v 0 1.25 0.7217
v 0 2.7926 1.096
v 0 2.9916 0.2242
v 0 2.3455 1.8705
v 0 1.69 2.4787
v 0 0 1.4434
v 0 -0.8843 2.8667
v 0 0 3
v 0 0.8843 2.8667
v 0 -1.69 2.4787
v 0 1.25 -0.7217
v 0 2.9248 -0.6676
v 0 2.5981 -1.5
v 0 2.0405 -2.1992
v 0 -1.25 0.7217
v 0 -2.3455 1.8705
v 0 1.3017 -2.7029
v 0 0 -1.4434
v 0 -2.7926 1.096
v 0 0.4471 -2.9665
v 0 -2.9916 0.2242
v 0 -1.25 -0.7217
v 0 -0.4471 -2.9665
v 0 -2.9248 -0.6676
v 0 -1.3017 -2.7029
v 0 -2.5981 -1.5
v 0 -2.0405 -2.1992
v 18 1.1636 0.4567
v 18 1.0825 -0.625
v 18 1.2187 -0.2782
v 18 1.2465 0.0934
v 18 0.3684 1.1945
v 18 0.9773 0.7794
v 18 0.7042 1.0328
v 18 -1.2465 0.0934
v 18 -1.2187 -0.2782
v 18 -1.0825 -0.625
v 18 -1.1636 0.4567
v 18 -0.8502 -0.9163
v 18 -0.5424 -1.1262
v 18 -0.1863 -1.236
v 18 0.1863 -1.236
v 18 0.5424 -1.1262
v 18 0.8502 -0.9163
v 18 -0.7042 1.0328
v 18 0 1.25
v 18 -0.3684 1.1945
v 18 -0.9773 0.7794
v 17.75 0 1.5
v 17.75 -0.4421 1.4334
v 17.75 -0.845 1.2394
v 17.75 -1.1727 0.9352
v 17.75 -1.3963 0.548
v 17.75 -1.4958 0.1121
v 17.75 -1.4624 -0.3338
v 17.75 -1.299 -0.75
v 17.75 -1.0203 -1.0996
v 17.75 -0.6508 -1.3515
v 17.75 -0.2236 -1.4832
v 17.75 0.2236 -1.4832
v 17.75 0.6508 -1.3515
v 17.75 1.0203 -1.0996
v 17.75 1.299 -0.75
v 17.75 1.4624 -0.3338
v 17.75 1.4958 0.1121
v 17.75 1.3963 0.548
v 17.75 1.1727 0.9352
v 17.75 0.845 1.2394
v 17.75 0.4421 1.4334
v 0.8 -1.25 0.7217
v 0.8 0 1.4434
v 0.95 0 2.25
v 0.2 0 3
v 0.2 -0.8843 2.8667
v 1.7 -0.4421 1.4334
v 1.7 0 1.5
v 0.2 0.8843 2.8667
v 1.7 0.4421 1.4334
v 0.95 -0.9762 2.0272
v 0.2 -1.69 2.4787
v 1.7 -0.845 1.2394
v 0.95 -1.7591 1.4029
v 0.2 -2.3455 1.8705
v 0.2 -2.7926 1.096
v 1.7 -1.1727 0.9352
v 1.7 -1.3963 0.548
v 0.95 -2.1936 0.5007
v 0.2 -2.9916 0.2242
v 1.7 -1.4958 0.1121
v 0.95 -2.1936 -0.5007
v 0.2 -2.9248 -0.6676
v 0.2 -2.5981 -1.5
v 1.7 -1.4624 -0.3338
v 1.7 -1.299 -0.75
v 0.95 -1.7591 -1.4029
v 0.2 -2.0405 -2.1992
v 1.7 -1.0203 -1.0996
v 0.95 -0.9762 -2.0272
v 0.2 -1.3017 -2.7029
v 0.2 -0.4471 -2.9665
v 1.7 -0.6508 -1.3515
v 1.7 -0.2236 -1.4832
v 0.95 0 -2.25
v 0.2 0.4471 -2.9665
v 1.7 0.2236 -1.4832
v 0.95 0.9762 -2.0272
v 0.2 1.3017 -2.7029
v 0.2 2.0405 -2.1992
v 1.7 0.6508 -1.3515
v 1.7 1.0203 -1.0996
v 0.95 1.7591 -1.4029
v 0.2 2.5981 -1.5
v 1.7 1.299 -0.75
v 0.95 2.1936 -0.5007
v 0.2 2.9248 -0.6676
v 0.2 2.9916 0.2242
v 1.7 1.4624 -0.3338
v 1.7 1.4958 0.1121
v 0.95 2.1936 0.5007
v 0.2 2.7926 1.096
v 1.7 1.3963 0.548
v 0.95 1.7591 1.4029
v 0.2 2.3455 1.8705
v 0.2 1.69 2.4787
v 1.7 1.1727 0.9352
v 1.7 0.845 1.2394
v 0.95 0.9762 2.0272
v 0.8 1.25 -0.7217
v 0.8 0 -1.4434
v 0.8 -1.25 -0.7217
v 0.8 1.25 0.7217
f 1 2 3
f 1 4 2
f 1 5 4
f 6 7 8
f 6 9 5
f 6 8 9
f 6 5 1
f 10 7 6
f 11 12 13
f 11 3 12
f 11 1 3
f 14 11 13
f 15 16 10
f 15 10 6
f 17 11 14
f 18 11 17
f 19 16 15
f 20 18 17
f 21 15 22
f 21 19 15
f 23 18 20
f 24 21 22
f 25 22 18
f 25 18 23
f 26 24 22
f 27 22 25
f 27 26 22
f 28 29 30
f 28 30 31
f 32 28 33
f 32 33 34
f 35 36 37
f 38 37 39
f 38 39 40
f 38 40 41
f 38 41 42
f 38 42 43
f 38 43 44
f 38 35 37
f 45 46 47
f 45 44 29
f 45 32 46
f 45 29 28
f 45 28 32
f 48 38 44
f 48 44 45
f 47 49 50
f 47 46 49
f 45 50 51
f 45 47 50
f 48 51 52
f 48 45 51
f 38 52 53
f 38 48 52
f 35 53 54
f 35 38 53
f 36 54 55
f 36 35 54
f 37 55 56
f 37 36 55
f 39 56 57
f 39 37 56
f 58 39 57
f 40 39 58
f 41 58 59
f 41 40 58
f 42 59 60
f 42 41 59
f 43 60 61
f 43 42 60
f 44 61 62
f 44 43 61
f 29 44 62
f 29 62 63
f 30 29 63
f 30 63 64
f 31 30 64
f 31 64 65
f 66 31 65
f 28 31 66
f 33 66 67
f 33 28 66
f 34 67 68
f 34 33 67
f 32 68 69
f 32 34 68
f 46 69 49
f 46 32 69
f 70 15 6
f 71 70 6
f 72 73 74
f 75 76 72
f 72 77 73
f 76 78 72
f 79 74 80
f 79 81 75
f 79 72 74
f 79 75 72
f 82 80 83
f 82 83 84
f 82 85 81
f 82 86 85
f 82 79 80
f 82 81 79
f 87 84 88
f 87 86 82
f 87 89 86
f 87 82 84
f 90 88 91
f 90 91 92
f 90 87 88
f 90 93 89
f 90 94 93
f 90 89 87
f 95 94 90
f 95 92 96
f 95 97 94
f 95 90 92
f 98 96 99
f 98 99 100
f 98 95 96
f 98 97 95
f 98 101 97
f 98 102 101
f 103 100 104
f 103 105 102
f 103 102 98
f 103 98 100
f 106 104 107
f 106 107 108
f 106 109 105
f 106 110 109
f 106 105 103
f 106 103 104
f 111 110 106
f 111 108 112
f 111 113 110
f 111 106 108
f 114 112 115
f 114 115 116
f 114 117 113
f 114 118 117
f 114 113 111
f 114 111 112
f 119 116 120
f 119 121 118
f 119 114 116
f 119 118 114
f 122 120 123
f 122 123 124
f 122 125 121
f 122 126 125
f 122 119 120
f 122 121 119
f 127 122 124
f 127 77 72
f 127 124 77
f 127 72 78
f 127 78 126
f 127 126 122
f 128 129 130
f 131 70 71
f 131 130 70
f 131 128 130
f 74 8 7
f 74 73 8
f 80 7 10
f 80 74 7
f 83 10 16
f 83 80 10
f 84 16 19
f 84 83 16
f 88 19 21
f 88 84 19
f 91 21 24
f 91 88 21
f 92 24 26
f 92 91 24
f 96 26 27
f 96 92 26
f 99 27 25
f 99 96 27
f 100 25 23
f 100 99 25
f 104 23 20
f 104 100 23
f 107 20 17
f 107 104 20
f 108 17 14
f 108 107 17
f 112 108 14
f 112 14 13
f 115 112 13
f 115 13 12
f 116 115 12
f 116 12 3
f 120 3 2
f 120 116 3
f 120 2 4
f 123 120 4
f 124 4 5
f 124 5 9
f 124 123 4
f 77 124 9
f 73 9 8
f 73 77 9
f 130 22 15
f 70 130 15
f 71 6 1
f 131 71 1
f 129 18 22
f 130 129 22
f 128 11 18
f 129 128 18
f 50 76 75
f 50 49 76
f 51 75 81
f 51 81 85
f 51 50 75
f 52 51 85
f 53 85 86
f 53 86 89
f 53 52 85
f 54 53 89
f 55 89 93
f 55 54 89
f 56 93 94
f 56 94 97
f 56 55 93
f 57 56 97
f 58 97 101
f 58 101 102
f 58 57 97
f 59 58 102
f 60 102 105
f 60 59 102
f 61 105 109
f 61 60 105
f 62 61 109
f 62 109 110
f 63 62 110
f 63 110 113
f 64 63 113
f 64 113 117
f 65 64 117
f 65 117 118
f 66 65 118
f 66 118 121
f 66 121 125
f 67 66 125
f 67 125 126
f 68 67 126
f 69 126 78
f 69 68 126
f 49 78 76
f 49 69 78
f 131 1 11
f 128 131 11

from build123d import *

# Parameters (mm, degrees)
CUT_EXTRUDE1_DEPTH = 0.8


with BuildPart() as part:
    # Sketch2 → Revolve1 (revolve)
    with BuildSketch(Plane.XY, mode=Mode.PRIVATE) as revolve1_sk:
        Polygon((0, 0), (0, 3), (0.2, 3), (1.7, 1.5), (17.75, 1.5), (18, 1.25), (18, 0), align=None)
    revolve(revolve1_sk.sketch.rotate(Axis((-2.281841559, 0, 0), (1, 0, 0)), 90), axis=Axis((-2.281841559, 0, 0), (1, 0, 0)))

    # Sketch3 → Cut-Extrude1 (cut)
    with BuildSketch(Plane.ZY):
        Polygon((0.721687836, -1.25), (1.443375673, 0), (0.721687836, 1.25), (-0.721687836, 1.25), (-1.443375673, 0), (-0.721687836, -1.25), align=None)
    extrude(amount=-CUT_EXTRUDE1_DEPTH, mode=Mode.SUBTRACT)


solid = part.part
